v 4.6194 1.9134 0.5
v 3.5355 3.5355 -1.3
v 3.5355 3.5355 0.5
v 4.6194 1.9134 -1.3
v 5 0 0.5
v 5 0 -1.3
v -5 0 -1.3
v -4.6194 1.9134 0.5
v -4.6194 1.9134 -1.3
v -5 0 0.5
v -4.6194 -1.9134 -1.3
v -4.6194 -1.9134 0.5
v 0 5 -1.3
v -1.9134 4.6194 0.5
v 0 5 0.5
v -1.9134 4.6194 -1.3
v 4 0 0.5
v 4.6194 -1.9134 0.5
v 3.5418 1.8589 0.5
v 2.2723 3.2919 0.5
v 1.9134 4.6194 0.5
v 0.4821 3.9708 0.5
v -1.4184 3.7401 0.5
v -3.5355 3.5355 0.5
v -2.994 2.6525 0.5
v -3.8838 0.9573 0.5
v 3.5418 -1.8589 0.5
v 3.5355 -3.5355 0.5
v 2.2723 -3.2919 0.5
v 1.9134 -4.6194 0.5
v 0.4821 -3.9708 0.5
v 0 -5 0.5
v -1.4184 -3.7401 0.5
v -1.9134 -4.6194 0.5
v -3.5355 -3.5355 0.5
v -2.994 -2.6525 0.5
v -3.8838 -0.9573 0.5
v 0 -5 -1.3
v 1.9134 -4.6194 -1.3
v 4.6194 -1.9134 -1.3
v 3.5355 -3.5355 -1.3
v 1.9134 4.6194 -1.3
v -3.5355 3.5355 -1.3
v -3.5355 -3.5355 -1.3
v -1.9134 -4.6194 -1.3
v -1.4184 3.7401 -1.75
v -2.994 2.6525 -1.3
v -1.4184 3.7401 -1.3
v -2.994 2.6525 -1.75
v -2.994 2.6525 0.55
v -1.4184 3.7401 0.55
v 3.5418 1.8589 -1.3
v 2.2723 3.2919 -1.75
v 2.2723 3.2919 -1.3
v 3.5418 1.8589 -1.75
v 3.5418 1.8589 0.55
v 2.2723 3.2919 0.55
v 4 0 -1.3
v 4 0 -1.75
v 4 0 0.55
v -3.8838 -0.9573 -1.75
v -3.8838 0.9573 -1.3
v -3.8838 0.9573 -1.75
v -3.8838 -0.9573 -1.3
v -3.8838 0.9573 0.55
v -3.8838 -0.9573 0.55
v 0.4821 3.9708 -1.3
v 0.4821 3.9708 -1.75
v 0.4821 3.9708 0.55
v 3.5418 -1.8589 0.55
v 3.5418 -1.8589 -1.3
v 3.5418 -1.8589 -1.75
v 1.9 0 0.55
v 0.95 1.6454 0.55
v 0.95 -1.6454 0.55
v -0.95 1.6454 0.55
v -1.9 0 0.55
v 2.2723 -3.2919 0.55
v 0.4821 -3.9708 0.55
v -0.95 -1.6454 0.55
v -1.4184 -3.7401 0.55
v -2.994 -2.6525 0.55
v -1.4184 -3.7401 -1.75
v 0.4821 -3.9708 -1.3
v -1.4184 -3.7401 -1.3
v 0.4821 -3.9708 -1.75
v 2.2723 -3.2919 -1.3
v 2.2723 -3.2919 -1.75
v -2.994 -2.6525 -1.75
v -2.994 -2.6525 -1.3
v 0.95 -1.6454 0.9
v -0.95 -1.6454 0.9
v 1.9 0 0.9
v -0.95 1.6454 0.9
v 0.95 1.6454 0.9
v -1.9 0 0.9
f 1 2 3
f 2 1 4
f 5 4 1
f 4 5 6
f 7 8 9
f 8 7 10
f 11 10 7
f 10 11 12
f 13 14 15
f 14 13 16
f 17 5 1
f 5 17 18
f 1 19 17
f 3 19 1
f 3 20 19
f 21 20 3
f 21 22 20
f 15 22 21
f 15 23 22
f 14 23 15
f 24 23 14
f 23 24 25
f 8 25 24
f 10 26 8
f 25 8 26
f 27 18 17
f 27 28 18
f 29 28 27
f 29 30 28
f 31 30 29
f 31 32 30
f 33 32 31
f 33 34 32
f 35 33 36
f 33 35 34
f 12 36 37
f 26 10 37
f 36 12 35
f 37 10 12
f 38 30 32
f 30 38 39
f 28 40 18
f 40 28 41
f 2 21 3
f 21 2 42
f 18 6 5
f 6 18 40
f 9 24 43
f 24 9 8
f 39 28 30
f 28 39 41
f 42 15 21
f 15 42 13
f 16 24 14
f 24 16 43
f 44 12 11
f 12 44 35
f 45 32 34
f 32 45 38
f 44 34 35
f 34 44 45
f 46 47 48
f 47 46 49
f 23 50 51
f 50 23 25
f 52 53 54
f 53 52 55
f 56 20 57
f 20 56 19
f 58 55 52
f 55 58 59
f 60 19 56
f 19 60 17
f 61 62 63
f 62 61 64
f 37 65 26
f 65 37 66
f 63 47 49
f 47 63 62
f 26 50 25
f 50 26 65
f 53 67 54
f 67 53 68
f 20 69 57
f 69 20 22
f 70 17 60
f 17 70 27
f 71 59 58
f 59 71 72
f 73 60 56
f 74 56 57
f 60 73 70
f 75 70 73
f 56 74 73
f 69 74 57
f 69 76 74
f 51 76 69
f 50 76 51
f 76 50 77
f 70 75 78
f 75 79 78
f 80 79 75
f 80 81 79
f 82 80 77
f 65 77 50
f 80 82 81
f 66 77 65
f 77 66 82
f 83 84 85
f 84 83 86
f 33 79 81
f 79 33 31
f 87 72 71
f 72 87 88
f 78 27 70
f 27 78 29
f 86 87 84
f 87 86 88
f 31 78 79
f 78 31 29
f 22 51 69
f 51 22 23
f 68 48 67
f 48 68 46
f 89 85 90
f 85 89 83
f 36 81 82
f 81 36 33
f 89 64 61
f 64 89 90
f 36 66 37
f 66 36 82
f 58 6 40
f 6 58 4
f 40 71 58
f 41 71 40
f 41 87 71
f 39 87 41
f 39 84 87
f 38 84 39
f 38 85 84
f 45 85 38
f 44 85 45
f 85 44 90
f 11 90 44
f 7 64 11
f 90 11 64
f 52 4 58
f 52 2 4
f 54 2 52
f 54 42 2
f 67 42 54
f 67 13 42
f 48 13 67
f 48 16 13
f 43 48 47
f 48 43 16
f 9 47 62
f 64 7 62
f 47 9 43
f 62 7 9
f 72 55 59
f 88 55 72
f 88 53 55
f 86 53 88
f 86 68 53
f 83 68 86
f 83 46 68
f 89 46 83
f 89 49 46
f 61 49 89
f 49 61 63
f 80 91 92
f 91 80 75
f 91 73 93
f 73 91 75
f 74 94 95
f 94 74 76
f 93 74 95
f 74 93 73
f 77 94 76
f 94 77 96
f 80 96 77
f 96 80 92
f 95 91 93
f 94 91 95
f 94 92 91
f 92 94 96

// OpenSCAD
// Parameters
inner_diameter_mm = 5; //[2.5:10:0.1]
outer_diameter_mm = 10; //[5:20:0.1]
thickness_mm      = 1; //[0.5:2:0.1]

// Structural overlap to guarantee fusion between stacked parts
overlap_mm = 1.2; //[0.2:2:0.1]
hole_cut_extra_h_mm = 2; //[1:10:0.5]

// Washer - base geometry (the actual requested part)
module washer_body_annulus() {
  difference() {
    cylinder(r=outer_diameter_mm/2, h=thickness_mm, center=true);
    cylinder(r=inner_diameter_mm/2, h=thickness_mm + hole_cut_extra_h_mm, center=true);
  }
}

// Helper: a solid disc layer (no hole) used to "attach" stacked layers to the washer
module solid_disc(r, h) {
  cylinder(r=r, h=h, center=true);
}

// Round Grommet Top - detailed geometry (kept, but now physically attached)
module round_grommet_top(z_center) {
  color("Silver")
  translate([0, 0, z_center]) {
    // main layer
    cylinder(r=outer_diameter_mm/2, h=thickness_mm, center=true);
    // small step on top (overlaps into main layer)
    translate([0, 0, (thickness_mm/2) - overlap_mm/2])
      cylinder(r=outer_diameter_mm/2 - 1, h=thickness_mm/2 + overlap_mm, center=true);
  }
}

// Round Grommet Assembly - detailed geometry (kept, but now physically attached)
module round_grommet_assembly(z_center) {
  color("DimGray")
  translate([0, 0, z_center]) {
    cylinder(r=outer_diameter_mm/2, h=thickness_mm, center=true);
    translate([0, 0, (thickness_mm/2) - overlap_mm/2])
      cylinder(r=outer_diameter_mm/2 - 1, h=thickness_mm/2 + overlap_mm, center=true);
  }
}

// Nut And Washer - detailed geometry (kept, but now physically attached)
module nut_and_washer(z_center) {
  color("Black")
  translate([0, 0, z_center]) {
    cylinder(r=outer_diameter_mm/2, h=thickness_mm, center=true);
    translate([0, 0, (thickness_mm/2) - overlap_mm/2])
      cylinder(r=outer_diameter_mm/2 - 1, h=thickness_mm/2 + overlap_mm, center=true);
  }
}

// Screw And Washer - detailed geometry (kept, but now physically attached)
module screw_and_washer(z_center) {
  color("Silver")
  translate([0, 0, z_center]) {
    cylinder(r=outer_diameter_mm/2, h=thickness_mm, center=true);
    translate([0, 0, (thickness_mm/2) - overlap_mm/2])
      cylinder(r=outer_diameter_mm/2 - 1, h=thickness_mm/2 + overlap_mm, center=true);
  }
}

// Assembly: all parts are unioned and stacked with guaranteed overlap.
// Also adds a small solid "spine" through the center to ensure every disc layer
// is physically connected to the washer (no floating / no separated concentric layers).
module assembly() {
  // Compute Z centers so each layer overlaps the previous by overlap_mm
  z0 = 0;
  step = thickness_mm - overlap_mm; // center-to-center spacing for overlap
  z1 = z0 + step;
  z2 = z1 + step;
  z3 = z2 + step;
  z4 = z3 + step;

  union() {
    // The actual washer (annulus with hole)
    washer_body_annulus();

    // Central solid connector (small post) to physically attach all stacked layers
    // to the washer while keeping the washer hole intact (post is smaller than hole).
    // This prevents "floating/disconnected" stacked discs and merges concentric layers.
    connector_r = max(0.6, inner_diameter_mm/2 - 0.6); // stays inside the 5mm hole
    connector_h = (z4 - z0) + thickness_mm + 2*overlap_mm;
    translate([0, 0, (z0 + z4)/2])
      solid_disc(connector_r, connector_h);

    // Stacked layers (now attached via overlap + central connector)
    round_grommet_top(z1);
    round_grommet_assembly(z2);
    nut_and_washer(z3);
    screw_and_washer(z4);
  }
}

assembly();
